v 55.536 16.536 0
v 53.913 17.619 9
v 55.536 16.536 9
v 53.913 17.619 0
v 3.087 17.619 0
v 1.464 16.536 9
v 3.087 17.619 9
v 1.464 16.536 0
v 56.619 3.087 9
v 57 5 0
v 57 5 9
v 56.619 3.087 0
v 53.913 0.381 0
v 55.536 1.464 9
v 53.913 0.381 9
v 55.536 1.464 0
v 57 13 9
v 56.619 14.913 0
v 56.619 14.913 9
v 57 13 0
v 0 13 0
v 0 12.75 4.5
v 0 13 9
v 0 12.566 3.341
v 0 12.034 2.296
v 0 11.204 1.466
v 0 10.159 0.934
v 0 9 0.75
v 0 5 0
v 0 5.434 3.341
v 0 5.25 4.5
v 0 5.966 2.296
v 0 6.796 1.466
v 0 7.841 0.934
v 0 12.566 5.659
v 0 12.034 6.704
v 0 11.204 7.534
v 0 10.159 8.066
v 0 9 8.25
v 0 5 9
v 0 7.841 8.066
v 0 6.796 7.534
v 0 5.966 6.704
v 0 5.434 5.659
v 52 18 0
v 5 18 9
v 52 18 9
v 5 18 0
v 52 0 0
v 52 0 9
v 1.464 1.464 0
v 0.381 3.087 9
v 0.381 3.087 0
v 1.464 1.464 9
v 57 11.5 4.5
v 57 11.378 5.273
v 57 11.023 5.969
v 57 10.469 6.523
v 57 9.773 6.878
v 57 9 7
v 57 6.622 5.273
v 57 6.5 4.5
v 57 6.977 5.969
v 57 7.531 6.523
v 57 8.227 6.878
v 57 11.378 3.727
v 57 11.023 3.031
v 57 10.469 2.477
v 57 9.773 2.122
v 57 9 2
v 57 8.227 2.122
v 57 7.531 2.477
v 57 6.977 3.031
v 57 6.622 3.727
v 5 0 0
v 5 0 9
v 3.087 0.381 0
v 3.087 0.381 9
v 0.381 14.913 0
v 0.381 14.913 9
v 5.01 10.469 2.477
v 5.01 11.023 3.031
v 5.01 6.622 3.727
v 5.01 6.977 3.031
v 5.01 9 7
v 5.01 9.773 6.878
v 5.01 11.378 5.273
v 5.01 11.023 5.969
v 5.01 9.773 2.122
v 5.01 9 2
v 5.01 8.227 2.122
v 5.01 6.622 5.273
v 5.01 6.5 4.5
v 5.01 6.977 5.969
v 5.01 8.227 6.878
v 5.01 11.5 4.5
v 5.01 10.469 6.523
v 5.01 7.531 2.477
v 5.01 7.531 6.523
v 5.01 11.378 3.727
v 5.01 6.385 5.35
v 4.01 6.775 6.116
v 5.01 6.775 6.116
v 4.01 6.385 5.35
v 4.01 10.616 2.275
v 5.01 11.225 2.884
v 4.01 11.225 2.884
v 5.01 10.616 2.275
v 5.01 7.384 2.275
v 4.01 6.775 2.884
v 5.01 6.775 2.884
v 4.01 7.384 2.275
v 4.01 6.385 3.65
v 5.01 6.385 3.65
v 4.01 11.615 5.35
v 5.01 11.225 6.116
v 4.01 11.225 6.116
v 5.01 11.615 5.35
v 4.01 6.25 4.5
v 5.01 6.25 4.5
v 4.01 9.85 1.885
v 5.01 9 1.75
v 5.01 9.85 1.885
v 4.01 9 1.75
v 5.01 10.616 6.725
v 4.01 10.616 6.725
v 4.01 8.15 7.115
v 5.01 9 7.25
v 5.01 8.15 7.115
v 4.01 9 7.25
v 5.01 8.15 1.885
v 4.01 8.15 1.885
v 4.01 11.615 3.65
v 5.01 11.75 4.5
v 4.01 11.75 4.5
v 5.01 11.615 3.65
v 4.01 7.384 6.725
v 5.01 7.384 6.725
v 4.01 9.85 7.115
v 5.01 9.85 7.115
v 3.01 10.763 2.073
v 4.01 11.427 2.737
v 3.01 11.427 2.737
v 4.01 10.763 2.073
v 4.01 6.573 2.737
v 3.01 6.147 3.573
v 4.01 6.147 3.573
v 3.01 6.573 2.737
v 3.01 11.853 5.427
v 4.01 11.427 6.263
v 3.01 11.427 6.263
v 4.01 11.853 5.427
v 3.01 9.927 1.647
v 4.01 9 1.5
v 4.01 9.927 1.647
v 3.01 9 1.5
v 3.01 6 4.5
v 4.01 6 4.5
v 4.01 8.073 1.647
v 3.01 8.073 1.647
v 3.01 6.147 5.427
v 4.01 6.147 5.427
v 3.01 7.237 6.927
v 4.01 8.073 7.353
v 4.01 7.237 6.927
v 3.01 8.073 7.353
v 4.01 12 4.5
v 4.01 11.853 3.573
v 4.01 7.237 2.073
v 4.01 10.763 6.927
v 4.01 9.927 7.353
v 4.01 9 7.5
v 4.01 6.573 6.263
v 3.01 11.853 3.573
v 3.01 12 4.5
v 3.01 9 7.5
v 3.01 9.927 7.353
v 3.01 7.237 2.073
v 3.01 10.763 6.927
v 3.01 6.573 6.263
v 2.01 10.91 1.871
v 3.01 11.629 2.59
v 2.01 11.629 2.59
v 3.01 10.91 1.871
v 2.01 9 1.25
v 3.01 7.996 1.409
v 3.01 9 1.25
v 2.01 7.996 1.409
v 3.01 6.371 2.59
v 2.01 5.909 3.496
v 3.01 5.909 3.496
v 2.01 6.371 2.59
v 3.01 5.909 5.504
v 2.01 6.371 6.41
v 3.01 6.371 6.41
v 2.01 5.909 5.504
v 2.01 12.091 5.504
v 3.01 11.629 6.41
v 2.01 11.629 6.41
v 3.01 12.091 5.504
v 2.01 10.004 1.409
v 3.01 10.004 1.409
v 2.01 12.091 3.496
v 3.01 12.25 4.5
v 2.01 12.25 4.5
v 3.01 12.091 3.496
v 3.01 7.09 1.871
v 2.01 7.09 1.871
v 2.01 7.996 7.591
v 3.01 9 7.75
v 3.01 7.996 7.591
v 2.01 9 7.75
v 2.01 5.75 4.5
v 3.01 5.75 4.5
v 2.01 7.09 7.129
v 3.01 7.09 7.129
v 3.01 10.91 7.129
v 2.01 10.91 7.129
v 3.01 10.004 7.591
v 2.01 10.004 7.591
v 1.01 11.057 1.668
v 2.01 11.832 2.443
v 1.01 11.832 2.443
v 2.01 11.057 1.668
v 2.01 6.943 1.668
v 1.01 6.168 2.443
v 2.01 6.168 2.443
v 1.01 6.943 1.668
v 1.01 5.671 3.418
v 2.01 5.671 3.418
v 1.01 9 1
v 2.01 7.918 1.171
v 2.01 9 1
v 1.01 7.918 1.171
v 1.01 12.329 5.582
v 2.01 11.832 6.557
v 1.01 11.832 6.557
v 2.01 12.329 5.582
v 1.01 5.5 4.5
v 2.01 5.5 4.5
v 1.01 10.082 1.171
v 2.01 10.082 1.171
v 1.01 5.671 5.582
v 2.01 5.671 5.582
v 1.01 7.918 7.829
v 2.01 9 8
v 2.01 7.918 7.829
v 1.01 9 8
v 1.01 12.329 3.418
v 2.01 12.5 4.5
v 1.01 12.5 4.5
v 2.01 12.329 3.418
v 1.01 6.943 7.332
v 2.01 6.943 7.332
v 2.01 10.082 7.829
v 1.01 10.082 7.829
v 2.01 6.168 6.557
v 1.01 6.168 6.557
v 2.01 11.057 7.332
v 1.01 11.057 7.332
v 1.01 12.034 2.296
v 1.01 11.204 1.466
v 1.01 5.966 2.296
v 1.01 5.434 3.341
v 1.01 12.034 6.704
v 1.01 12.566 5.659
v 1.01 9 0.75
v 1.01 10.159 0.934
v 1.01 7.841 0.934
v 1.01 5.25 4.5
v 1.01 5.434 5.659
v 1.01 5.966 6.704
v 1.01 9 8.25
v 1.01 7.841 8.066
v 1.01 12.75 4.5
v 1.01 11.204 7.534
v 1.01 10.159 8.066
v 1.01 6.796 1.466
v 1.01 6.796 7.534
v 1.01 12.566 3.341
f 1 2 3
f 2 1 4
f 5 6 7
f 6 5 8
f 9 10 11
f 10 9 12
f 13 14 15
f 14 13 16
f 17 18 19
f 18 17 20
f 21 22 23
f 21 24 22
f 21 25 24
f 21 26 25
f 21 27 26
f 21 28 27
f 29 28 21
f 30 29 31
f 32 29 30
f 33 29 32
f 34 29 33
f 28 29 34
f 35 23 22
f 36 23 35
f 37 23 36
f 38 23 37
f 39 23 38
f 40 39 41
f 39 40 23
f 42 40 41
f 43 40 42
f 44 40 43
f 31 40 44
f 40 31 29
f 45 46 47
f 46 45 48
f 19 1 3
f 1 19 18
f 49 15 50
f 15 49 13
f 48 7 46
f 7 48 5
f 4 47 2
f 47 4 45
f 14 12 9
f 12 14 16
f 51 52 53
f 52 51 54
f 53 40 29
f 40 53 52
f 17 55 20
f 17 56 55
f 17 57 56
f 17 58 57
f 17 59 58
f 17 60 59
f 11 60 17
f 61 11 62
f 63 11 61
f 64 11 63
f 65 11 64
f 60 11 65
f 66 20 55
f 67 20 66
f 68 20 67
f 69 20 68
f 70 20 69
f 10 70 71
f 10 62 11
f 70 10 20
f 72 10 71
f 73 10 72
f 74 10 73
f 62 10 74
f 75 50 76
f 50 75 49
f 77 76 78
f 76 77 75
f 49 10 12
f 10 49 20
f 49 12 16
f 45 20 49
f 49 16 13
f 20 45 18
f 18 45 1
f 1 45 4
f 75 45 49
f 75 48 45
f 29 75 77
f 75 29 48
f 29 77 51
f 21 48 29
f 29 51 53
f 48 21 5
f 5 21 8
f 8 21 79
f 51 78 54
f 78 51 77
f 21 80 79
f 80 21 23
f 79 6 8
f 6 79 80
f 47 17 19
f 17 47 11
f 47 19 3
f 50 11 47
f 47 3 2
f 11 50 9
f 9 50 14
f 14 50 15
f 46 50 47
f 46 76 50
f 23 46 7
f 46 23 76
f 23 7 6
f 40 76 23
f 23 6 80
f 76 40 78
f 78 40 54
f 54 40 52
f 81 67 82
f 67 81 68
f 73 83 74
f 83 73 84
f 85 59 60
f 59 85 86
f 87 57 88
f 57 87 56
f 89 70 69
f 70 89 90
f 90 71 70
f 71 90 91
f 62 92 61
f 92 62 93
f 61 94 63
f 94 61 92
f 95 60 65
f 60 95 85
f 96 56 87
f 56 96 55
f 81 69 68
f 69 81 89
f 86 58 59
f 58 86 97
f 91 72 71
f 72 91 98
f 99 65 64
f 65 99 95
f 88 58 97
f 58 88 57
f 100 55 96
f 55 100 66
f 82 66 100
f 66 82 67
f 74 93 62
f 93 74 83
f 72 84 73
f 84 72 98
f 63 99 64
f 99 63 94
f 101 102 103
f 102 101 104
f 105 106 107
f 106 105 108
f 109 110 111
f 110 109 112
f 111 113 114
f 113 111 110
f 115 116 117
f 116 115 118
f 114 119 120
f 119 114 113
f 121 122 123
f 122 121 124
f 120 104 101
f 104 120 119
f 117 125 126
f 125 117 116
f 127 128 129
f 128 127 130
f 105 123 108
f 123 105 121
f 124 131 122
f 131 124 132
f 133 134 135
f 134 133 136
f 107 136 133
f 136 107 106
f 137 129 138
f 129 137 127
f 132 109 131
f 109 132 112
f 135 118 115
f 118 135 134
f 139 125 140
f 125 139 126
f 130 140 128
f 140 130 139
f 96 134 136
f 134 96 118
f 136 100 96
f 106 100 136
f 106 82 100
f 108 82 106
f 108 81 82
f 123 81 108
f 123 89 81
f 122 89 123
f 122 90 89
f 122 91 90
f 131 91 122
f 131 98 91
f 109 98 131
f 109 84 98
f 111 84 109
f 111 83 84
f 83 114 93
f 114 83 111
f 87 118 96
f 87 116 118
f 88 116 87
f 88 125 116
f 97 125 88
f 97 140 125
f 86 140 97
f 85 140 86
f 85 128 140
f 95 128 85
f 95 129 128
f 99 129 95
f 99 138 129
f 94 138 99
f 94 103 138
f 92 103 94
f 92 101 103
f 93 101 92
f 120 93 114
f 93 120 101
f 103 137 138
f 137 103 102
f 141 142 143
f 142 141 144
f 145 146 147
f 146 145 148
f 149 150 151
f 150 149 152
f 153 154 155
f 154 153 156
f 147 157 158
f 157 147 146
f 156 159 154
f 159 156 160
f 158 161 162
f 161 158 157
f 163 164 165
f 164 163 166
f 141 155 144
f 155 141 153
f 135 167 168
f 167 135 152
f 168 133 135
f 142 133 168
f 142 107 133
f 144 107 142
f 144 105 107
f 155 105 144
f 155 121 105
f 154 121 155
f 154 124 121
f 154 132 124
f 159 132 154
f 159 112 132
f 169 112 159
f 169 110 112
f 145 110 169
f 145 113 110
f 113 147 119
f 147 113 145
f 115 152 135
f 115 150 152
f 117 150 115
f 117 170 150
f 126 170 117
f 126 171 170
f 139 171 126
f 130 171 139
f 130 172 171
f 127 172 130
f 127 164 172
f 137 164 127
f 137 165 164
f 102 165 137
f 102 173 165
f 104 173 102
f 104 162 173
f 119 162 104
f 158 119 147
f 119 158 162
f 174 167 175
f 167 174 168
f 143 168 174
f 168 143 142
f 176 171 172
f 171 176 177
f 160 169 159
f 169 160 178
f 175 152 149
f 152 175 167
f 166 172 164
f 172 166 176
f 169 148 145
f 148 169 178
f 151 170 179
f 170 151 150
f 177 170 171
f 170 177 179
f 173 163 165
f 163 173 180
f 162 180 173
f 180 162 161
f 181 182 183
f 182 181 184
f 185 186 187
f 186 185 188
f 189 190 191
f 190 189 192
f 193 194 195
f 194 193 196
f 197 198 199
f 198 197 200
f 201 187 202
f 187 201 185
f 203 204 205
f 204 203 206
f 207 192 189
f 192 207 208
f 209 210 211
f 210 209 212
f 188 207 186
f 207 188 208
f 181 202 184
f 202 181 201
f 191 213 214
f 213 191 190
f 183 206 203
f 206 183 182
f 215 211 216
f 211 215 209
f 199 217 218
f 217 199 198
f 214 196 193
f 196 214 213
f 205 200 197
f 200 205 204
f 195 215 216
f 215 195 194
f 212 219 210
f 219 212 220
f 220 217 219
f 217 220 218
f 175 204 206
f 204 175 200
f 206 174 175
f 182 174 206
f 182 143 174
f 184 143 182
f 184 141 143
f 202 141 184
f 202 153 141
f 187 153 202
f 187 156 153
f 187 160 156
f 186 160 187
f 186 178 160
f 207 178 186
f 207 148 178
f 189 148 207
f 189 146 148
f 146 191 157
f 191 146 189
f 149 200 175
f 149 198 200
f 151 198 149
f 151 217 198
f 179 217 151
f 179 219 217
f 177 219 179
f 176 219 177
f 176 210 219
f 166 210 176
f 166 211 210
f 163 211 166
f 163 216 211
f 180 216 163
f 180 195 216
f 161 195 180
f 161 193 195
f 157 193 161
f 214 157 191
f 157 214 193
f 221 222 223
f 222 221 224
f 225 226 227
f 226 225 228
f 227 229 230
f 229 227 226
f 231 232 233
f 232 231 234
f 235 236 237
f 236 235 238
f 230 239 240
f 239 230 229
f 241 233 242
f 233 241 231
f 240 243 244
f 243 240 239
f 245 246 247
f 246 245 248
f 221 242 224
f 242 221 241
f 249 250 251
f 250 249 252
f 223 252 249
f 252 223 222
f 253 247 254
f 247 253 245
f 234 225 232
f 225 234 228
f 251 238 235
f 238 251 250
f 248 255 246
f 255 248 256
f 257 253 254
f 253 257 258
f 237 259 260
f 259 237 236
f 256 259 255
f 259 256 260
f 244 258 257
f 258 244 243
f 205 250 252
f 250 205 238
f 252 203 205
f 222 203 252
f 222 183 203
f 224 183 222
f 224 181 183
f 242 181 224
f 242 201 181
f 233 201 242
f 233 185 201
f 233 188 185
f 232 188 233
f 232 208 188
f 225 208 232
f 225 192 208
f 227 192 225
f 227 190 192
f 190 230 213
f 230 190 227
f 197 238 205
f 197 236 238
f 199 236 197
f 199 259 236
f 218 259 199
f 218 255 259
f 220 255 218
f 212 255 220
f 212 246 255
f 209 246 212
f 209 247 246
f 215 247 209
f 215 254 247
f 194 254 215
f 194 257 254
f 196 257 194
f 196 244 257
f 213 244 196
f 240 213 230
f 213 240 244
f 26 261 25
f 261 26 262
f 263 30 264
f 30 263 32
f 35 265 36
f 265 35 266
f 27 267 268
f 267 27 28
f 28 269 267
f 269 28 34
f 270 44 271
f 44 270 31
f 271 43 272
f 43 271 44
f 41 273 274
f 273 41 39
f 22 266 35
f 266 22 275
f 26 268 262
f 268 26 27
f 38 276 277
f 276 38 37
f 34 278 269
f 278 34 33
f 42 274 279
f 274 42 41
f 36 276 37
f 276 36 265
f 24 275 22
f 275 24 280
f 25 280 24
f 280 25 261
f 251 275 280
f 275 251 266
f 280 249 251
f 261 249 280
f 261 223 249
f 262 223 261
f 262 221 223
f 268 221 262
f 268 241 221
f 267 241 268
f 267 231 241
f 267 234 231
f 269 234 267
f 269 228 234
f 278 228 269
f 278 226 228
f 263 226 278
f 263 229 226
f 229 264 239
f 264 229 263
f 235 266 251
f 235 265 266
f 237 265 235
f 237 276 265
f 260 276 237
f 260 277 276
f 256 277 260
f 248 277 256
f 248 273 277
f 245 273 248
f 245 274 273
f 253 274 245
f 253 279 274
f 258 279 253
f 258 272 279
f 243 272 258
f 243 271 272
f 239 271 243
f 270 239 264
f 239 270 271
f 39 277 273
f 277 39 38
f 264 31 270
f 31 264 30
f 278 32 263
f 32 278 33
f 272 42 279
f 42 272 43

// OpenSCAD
//bin/sh -c 'grep if.\(workon tool-mount.scad | cut -d\" -f2 | xargs -I X openscad -D workon=\"X\" -o X.stl tool-mount.scad'; exit

workon = "5mm_screwdriver";
xsize = 57;
ysize = 18;
radius = 5;

// make a base which matches Din_Rail_Adapter.
module base(thickness) {
        hull() {
            translate([radius, radius, 0]) cylinder(r=radius, h=thickness);
            translate([xsize-radius, radius, 0]) cylinder(r=radius, h=thickness);
            translate([radius, ysize-radius, 0]) cylinder(r=radius, h=thickness);
            translate([xsize-radius, ysize-radius, 0]) cylinder(r=radius, h=thickness);
        }
}

// generic screwdriver.
module screwdriver(thickness, diameter) {
    difference() {
        base(thickness);
        translate([-0.01,ysize/2,thickness/2 ]) rotate([0,90,0]) cylinder(d=diameter, h=xsize + 0.02, $fn=20); 
        translate([-0.01,ysize/2,thickness/2 ]) rotate([0,90,0]) cylinder(d=diameter+.5, h=5 + 0.02, $fn=20); 
        translate([-0.01,ysize/2,thickness/2 ]) rotate([0,90,0]) cylinder(d=diameter+1, h=4 + 0.02, $fn=20); 
        translate([-0.01,ysize/2,thickness/2 ]) rotate([0,90,0]) cylinder(d=diameter+1.5, h=3 + 0.02, $fn=20); 
        translate([-0.01,ysize/2,thickness/2 ]) rotate([0,90,0]) cylinder(d=diameter+2, h=2 + 0.02, $fn=20); 
        translate([-0.01,ysize/2,thickness/2 ]) rotate([0,90,0]) cylinder(d=diameter+2.5, h=1 + 0.02, $fn=20); 
    }
}


if (workon == "5mm_screwdriver") {
    screwdriver( thickness = 9, diameter = 5);
}

if (workon == "6mm_screwdriver") {
    screwdriver( thickness = 10, diameter = 6);
}

if (workon == "7mm_screwdriver") {
    screwdriver( thickness = 11, diameter = 7);
}

if (workon == "8mm_screwdriver") {
    screwdriver( thickness = 12, diameter = 8 );
}

if (workon == "9mm_screwdriver") {
    screwdriver( thickness = 13, diameter = 9 );
}

if (workon == "10mm_screwdriver") {
    screwdriver( thickness = 14, diameter = 10 );
}

if (workon == "11mm_screwdriver") {
    screwdriver( thickness = 15, diameter = 11 );
}

if (workon == "12mm_screwdriver") {
    screwdriver( thickness = 16, diameter = 12 );
}

if (workon == "small_pliers") {
    xsize2 = 41.5;
    ysize2 = 12.5;
    depth = 9.6;
    thickness = 14;
    diameter = 8;
    tip_diameter = 5.5;

    difference() {
        base(thickness);
        translate([-0.01, (ysize - ysize2)/2, (thickness - depth)/2]) cube([xsize2 + 0.02, ysize2, depth]); 
        translate([xsize2, ysize/2, thickness/2]) rotate([0,90,0]) cylinder(d=tip_diameter, h=xsize - xsize2 + 0.02);
    }
}


module wrench(post_d, post_h, ttt, thickness = 5, angle=0, tsize=8) {
    slop_width = 2;
    slop_height = 2;
    base(thickness);
    difference() {
        union() {
            post_h =  post_h / cos(angle);
            translate([15,ysize/2,thickness]) rotate([0,0,90]) linear_extrude(height=1) text(ttt, tsize, "Arial", halign="center");
            translate([xsize / 2 + post_d/3, ysize / 2, 0]) rotate([0,-angle,0]) union() {
                translate([0, 0, thickness]) cylinder(d=post_d - slop_width, h=post_h);
                // make the post tend to hold the tool
                translate([0, 0, thickness + post_h]) cylinder(d1=post_d -slop_width/2, d2=post_d, h=post_h/2);
                translate([0, 0, thickness + post_h * 1.5]) cylinder(d2=post_d -slop_width*2, d1=post_d, h=post_h/2);
            }
            // make a filet around the base of the post
            translate([xsize / 2 - 2 + post_d/3, ysize / 2, 0]) scale([1 / cos(angle), 1, 1]) union() {
                translate([0, 0,, thickness]) cylinder(d1 = post_d, d2=post_d - slop_width, h=slop_height);
                translate([0, 0,, thickness]) cylinder(d1 = post_d + slop_width, d2=post_d-slop_width/2, h=slop_height/2);
                translate([0, 0,, thickness + slop_height * 3/4]) cylinder(d1 = post_d - slop_width*3/4, d2=post_d-slop_width, h=slop_height/2);
            }
        }
        translate([0,ysize + 0.01,0]) base(thickness);
        translate([0,-ysize - 0.01,0]) base(thickness);
        translate([0,ysize + 0.01,thickness-0.01]) rotate([-9,0,0]) base(thickness*1.5);
        translate([0,-ysize - 0.01,thickness-0.01-3]) rotate([9,0,0]) base(thickness*1.5);
    }
}

if (workon == "wrench_straight_5_8") {
    post_d = 15.8; // for a combination 5/8" wrench with a flat (rachet) end.
    post_h = 10.7;
    wrench(post_d, post_h, "5/8");
}

if (workon == "wrench_straight_3_4") {
    thickness = 5;
    post_d = 19.2; // for a combination 3/4" wrench with a flat (rachet) end.
    post_h = 11.4;
    // we need to trim the base off a little bit.
    difference() {
        wrench(post_d, post_h, "3/4", thickness);
        translate([0,ysize + 0.01,0]) base(thickness * 1.5);
        translate([0,-ysize - 0.01,0]) base(thickness * 1.5);
    }
}

if (workon == "wrench_15_1_2") {
    post_d = 13.1; // for a combination 1/2" wrench with a 15 degree tilt.
    post_h = 8.2;
    wrench(post_d, post_h, "1/2", angle=15);
}

if (workon == "wrench_15_11_32") {
    post_d = 8.5; // for a combination 11/32" wrench with a 15 degree tilt.
    post_h = 6.2;
    wrench(post_d, post_h, "11/32", angle=15, tsize=5);
}

if (workon == "wrench_15_3_8") {
    post_d = 9.8; // for a combination 3/8" wrench with a 15 degree tilt.
    post_h = 7.24;
    wrench(post_d, post_h, "3/8", angle=15);
}

if (workon == "wrench_15_7_8") {
    thickness = 5;
    post_d = 23.2; // for a combination 3/8" wrench with a 15 degree tilt.
    post_h = 12.0;
    wrench(post_d, post_h, "7/8", thickness, angle=15);
}

if (workon == "wrench_15_3_4") {
    thickness = 5;
    post_d = 20.2; // for a combination 3/4" wrench with a 15 degree tilt.
    post_h = 11.3;
    wrench(post_d, post_h, "3/4", thickness, angle=15);
}


if (workon == "wrench_15_11_16") {
    thickness = 5;
    post_d = 17.5; // for a combination 11/16" wrench with a 15 degree tilt.
    post_h = 10.75;
    wrench(post_d, post_h, "11/16", thickness, angle=15, tsize=5);
}


if (workon == "wrench_15_13_16") {
    thickness = 5;
    post_d = 20.0; // for a combination 13/16" wrench with a 15 degree tilt.
    post_h = 12.3;
    wrench(post_d, post_h, "13/16", thickness, angle=15, tsize=5);
}

// needs two bases.
if (workon == "small_clippers") {
    thickness = 16;
    ytotal = 55;
    spacing = ytotal - ysize - ysize;
    xsize2 = 47;
    ysize2 = 45;
    depth = 12;
    difference() {
        union() {
            base(thickness);
            translate([0, spacing + ysize, 0]) base(thickness);
            translate([radius, ysize, 0]) cube([xsize - radius*2, spacing, thickness]);
        }
        translate([-0.01, (ytotal - ysize2)/2, (thickness - depth)/2]) cube([xsize2 + 0.02, ysize2, depth]); 
    }
}

// needs two bases.
if (workon == "needlenose_pliers") {
    thickness = 16;
    ytotal = 55;
    spacing = ytotal - ysize - ysize;
    xsize2 = 40;
    ysize2 = 45;
    depth = 12;
    tip_diameter = 6.2;
    difference() {
        union() {
            base(thickness);
            translate([0, spacing + ysize, 0]) base(thickness);
            translate([radius, ysize, 0]) cube([xsize - radius*2, spacing, thickness]);
        }
        translate([-0.01, (ytotal - ysize2)/2, (thickness - depth)/2]) cube([xsize2 + 0.02, ysize2, depth]); 
        translate([xsize2-0.01, ysize + spacing/2, thickness/2]) rotate([0,90,0]) scale([1,8.3/6.2,1]) cylinder(d1=tip_diameter*1.8, d2=tip_diameter, h=xsize - xsize2 - radius + 0.02);
    }
}


// needs two bases.
if (workon == "20mm_chisel") {
    thickness = 10;
    zsize = 6;
    ywidth = 20;
    difference() {
        hull() {
            base(thickness);
            translate([0, ysize, 0]) base(thickness);
        }
        translate([0 - 0.01,(ysize*2 -ywidth)/2,(thickness - zsize) /2]) cube([xsize - 5, ywidth, zsize]);
        translate([0 - 0.01,(ysize*2 -ywidth)/2,(thickness - zsize) /2])  {
            xsize = 5;
            polyhedron([
                [0, -ywidth*.10, -zsize*.2], [0, ywidth*1.1, -zsize*.2],
                [0, -ywidth*.10, zsize*1.2], [0, ywidth*1.1, zsize*1.2],
                [xsize, 0, zsize], [xsize, ywidth, zsize],
                [xsize, 0, 0], [xsize, ywidth, 0],
            ],[
                [0,1,7,6],
                [0,6,4,2],
                [1,3,5,7],
                [0,2,3,1],
                [4,6,7,5],
                [2,4,5,3],
            ], 2);
        }
    }
}
 
